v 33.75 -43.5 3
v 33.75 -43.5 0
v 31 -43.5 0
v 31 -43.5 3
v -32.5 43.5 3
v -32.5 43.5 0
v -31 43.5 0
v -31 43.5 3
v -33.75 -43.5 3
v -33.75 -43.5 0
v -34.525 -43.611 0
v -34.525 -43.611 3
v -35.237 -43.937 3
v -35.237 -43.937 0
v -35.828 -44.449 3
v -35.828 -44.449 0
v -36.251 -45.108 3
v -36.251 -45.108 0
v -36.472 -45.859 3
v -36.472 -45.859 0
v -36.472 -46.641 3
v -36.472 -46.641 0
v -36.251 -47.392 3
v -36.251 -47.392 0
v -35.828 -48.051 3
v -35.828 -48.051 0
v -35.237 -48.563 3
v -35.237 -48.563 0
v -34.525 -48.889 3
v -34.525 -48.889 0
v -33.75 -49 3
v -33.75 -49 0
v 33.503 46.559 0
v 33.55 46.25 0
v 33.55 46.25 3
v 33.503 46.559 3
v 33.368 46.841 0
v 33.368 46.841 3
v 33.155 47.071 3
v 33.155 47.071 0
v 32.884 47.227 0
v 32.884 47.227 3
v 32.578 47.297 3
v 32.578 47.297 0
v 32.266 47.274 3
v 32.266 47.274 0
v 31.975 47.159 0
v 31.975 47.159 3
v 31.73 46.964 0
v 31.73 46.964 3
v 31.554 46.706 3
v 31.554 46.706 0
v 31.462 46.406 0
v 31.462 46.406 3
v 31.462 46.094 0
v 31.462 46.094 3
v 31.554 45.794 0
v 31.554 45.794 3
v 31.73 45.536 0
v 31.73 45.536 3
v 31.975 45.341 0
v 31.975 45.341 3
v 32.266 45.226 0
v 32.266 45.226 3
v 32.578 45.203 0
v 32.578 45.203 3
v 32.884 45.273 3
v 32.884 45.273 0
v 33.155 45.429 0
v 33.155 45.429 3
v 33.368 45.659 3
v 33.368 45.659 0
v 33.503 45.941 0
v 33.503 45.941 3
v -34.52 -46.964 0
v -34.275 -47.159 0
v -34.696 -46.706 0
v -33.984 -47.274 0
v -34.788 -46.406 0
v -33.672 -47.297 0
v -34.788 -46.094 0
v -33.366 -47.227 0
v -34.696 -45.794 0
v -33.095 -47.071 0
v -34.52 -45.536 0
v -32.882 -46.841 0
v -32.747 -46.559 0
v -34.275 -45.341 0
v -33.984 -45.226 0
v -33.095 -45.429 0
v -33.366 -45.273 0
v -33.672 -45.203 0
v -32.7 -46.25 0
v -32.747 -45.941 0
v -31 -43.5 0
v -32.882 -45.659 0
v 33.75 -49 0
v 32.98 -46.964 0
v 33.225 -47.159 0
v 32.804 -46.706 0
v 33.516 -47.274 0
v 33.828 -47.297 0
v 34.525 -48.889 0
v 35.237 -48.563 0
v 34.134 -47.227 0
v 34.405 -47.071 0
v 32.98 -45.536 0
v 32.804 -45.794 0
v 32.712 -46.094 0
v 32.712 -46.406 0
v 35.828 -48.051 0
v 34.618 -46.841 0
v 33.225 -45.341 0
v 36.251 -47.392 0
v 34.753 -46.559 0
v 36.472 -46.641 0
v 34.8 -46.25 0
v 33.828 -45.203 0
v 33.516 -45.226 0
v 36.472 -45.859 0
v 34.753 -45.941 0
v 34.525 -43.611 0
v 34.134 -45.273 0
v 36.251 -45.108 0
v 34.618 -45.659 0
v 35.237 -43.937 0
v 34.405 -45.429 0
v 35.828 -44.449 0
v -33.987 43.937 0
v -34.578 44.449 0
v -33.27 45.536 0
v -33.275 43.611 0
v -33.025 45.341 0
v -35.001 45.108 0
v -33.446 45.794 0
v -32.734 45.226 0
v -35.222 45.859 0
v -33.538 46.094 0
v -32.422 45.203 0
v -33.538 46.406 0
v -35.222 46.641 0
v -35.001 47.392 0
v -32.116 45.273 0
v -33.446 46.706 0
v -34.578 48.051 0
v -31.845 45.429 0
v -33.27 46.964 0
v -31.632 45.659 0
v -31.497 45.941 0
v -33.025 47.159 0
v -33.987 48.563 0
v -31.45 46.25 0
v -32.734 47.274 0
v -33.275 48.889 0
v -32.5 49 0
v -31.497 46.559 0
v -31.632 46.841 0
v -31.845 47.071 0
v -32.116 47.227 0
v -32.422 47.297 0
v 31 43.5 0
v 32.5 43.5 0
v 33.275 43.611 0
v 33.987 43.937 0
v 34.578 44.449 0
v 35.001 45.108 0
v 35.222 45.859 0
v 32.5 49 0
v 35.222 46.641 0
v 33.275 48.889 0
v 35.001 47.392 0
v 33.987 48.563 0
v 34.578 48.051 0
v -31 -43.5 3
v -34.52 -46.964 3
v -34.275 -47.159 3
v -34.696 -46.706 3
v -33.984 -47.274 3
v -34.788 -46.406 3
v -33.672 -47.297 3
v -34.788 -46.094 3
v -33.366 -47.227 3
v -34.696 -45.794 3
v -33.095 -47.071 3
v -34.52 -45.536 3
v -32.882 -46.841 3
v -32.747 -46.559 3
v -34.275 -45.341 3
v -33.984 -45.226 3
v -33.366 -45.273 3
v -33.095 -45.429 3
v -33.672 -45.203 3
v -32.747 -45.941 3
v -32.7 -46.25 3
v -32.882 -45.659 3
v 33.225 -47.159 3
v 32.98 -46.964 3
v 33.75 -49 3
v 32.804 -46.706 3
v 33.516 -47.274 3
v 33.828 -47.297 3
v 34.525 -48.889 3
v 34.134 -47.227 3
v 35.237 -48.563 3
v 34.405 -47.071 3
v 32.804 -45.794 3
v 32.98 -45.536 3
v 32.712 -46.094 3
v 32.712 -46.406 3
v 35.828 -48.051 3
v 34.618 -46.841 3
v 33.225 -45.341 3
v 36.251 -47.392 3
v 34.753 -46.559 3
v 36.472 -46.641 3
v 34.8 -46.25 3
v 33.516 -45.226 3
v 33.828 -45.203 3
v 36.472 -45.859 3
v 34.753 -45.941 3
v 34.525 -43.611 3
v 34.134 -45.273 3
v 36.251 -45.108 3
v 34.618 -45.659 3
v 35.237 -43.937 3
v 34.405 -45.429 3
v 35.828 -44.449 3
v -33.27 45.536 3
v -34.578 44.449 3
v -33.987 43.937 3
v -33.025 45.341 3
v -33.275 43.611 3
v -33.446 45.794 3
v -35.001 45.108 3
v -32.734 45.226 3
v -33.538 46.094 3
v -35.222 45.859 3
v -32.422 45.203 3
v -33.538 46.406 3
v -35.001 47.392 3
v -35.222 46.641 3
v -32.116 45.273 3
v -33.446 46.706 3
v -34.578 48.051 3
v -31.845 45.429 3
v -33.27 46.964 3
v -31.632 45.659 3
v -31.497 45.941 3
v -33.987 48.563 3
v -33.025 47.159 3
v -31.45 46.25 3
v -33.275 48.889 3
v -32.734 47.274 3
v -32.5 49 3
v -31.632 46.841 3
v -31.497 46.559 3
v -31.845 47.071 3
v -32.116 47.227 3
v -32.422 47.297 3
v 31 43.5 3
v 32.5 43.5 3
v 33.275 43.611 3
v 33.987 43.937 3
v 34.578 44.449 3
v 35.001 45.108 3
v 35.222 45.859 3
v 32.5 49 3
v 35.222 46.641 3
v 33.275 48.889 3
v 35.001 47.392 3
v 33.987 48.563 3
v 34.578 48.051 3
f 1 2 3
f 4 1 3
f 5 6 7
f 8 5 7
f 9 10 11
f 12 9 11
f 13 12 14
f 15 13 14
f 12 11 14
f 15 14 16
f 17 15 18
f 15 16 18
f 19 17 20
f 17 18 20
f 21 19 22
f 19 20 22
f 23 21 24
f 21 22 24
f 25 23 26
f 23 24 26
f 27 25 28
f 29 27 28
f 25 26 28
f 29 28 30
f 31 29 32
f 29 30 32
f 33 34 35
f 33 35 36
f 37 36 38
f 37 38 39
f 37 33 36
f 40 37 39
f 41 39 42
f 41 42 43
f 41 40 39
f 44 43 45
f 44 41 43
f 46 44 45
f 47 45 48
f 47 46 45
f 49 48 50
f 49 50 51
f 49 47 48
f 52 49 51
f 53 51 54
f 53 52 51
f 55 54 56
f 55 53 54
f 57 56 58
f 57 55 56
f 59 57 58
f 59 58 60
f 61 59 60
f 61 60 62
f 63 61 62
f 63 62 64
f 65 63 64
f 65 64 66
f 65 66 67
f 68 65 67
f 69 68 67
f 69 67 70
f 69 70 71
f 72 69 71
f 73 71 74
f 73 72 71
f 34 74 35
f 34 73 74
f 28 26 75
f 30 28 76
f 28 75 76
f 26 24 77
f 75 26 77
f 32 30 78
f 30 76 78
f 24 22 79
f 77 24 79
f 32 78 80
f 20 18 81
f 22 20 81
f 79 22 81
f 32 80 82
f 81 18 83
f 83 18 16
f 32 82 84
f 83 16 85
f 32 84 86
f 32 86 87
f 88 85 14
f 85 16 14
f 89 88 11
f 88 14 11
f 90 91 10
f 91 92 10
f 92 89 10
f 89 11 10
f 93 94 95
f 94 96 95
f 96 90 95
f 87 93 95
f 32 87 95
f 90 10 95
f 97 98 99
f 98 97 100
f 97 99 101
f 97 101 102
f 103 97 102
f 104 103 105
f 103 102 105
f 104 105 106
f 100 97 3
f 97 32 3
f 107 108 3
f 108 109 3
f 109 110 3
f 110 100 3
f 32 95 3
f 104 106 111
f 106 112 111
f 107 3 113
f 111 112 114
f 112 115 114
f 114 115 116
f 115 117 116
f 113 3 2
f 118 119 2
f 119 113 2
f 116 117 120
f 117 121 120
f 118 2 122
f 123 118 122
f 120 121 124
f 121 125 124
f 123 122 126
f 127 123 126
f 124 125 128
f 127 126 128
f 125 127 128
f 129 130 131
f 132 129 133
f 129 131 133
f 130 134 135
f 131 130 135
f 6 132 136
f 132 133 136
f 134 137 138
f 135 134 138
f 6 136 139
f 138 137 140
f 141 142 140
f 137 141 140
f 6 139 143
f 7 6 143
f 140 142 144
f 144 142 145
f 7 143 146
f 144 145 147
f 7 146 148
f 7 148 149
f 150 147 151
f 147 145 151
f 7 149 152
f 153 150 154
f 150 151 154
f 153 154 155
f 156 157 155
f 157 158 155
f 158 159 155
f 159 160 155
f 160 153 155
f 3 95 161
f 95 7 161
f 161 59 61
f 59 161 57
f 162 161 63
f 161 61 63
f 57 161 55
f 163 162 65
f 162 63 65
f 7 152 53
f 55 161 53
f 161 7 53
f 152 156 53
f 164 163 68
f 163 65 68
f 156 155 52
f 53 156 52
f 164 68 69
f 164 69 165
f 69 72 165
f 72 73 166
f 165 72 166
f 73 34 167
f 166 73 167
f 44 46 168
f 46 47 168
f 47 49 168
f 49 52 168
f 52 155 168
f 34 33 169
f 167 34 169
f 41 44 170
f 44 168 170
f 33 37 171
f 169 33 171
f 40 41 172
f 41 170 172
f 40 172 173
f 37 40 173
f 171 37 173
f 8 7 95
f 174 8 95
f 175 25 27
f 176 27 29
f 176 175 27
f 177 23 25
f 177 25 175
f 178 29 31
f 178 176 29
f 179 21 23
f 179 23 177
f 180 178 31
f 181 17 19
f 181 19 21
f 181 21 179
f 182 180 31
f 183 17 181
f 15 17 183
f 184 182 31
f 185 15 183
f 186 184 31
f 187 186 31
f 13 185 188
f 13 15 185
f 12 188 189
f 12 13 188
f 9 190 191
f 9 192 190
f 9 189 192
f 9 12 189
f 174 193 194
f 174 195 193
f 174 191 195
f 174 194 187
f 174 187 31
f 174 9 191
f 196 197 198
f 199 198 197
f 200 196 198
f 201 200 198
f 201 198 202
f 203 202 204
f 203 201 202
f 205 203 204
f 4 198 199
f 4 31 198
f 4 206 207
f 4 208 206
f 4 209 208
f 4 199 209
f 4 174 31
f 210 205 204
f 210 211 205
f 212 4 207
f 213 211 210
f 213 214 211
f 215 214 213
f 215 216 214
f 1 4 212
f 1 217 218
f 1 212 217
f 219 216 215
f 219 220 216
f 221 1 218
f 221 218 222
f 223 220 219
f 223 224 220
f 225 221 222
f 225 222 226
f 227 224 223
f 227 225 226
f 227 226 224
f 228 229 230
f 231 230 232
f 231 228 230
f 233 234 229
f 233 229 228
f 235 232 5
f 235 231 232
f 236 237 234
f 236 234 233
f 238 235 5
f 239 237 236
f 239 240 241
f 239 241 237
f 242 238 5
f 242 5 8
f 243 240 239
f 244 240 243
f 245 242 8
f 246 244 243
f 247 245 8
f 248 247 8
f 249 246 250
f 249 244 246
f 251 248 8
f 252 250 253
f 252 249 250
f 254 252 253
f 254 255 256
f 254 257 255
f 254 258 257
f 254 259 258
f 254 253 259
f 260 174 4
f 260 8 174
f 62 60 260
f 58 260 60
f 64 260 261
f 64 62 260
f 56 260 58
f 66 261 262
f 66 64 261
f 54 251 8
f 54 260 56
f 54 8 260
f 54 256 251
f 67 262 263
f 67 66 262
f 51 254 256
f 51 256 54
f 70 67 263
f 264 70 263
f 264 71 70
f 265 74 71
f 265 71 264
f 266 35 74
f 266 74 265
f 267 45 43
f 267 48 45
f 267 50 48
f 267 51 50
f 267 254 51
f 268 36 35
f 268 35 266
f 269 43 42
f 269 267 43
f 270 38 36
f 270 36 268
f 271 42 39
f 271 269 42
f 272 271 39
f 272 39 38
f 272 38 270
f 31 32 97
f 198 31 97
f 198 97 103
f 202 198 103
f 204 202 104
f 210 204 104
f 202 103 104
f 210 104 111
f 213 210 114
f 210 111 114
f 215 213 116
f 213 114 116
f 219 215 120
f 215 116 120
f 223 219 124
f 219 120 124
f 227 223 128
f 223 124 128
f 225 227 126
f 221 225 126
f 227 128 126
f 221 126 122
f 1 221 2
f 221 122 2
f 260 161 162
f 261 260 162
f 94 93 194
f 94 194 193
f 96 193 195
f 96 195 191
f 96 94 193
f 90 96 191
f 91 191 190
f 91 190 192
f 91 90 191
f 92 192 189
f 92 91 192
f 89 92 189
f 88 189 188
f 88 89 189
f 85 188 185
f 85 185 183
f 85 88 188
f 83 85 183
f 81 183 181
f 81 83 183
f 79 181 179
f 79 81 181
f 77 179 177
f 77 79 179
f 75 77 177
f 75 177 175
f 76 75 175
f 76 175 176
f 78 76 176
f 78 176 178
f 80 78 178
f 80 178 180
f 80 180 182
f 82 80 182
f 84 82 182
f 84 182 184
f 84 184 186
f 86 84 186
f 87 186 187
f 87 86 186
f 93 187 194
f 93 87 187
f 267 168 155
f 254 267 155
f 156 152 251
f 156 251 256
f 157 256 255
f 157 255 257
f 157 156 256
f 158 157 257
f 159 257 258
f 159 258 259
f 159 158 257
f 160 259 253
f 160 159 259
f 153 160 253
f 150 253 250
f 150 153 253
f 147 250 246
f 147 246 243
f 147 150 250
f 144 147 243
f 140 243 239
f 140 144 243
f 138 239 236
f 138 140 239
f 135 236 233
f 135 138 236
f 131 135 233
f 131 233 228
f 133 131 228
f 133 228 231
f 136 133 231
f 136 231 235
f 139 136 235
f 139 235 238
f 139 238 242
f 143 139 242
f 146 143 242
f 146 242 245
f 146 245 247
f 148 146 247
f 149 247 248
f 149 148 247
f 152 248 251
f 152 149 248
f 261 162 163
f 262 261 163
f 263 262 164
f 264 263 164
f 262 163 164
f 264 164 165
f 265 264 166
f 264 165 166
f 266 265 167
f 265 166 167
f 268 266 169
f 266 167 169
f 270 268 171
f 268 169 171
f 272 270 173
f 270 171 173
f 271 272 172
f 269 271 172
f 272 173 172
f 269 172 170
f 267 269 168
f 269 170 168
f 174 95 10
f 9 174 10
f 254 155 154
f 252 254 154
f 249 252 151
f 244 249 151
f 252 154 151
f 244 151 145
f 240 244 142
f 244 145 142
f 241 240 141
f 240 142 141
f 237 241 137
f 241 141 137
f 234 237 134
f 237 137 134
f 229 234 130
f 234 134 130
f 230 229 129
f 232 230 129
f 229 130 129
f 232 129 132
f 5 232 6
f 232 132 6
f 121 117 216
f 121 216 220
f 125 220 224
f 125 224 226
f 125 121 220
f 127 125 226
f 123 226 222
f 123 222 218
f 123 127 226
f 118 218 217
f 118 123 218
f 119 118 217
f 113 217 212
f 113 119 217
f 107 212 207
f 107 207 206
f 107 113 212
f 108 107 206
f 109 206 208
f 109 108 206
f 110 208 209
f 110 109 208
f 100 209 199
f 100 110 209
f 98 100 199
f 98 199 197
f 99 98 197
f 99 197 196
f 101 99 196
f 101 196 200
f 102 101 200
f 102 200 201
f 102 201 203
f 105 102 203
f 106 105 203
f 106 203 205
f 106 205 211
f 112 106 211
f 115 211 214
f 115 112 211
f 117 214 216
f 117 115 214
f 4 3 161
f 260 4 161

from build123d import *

# Parameters (mm, degrees)
F0_R     = 1.05
F1_DEPTH = 3


with BuildPart() as f1:
    # F0 (on Top) → F1 (new body)
    with BuildSketch(Plane.XY):
        with BuildLine():
            Line((-31, -43.5), (-33.75, -43.5))
            ThreePointArc((-33.75, -43.5), (-36.5, -46.25), (-33.75, -49))
            Line((-33.75, -49), (33.75, -49))
            ThreePointArc((33.75, -49), (36.5, -46.25), (33.75, -43.5))
            Line((33.75, -43.5), (31, -43.5))
            Line((31, -43.5), (31, 43.5))
            Line((31, 43.5), (32.5, 43.5))
            ThreePointArc((32.5, 43.5), (35.25, 46.25), (32.5, 49))
            Line((32.5, 49), (-32.5, 49))
            ThreePointArc((-32.5, 49), (-35.25, 46.25), (-32.5, 43.5))
            Line((-32.5, 43.5), (-31, 43.5))
            Line((-31, 43.5), (-31, -43.5))
        make_face()
        with Locations((-33.75, -46.25)):
            Circle(F0_R, mode=Mode.SUBTRACT)
        with Locations((33.75, -46.25)):
            Circle(F0_R, mode=Mode.SUBTRACT)
        with Locations((-32.5, 46.25)):
            Circle(F0_R, mode=Mode.SUBTRACT)
        with Locations((32.5, 46.25)):
            Circle(F0_R, mode=Mode.SUBTRACT)
    extrude(amount=F1_DEPTH)


solid = f1.part
